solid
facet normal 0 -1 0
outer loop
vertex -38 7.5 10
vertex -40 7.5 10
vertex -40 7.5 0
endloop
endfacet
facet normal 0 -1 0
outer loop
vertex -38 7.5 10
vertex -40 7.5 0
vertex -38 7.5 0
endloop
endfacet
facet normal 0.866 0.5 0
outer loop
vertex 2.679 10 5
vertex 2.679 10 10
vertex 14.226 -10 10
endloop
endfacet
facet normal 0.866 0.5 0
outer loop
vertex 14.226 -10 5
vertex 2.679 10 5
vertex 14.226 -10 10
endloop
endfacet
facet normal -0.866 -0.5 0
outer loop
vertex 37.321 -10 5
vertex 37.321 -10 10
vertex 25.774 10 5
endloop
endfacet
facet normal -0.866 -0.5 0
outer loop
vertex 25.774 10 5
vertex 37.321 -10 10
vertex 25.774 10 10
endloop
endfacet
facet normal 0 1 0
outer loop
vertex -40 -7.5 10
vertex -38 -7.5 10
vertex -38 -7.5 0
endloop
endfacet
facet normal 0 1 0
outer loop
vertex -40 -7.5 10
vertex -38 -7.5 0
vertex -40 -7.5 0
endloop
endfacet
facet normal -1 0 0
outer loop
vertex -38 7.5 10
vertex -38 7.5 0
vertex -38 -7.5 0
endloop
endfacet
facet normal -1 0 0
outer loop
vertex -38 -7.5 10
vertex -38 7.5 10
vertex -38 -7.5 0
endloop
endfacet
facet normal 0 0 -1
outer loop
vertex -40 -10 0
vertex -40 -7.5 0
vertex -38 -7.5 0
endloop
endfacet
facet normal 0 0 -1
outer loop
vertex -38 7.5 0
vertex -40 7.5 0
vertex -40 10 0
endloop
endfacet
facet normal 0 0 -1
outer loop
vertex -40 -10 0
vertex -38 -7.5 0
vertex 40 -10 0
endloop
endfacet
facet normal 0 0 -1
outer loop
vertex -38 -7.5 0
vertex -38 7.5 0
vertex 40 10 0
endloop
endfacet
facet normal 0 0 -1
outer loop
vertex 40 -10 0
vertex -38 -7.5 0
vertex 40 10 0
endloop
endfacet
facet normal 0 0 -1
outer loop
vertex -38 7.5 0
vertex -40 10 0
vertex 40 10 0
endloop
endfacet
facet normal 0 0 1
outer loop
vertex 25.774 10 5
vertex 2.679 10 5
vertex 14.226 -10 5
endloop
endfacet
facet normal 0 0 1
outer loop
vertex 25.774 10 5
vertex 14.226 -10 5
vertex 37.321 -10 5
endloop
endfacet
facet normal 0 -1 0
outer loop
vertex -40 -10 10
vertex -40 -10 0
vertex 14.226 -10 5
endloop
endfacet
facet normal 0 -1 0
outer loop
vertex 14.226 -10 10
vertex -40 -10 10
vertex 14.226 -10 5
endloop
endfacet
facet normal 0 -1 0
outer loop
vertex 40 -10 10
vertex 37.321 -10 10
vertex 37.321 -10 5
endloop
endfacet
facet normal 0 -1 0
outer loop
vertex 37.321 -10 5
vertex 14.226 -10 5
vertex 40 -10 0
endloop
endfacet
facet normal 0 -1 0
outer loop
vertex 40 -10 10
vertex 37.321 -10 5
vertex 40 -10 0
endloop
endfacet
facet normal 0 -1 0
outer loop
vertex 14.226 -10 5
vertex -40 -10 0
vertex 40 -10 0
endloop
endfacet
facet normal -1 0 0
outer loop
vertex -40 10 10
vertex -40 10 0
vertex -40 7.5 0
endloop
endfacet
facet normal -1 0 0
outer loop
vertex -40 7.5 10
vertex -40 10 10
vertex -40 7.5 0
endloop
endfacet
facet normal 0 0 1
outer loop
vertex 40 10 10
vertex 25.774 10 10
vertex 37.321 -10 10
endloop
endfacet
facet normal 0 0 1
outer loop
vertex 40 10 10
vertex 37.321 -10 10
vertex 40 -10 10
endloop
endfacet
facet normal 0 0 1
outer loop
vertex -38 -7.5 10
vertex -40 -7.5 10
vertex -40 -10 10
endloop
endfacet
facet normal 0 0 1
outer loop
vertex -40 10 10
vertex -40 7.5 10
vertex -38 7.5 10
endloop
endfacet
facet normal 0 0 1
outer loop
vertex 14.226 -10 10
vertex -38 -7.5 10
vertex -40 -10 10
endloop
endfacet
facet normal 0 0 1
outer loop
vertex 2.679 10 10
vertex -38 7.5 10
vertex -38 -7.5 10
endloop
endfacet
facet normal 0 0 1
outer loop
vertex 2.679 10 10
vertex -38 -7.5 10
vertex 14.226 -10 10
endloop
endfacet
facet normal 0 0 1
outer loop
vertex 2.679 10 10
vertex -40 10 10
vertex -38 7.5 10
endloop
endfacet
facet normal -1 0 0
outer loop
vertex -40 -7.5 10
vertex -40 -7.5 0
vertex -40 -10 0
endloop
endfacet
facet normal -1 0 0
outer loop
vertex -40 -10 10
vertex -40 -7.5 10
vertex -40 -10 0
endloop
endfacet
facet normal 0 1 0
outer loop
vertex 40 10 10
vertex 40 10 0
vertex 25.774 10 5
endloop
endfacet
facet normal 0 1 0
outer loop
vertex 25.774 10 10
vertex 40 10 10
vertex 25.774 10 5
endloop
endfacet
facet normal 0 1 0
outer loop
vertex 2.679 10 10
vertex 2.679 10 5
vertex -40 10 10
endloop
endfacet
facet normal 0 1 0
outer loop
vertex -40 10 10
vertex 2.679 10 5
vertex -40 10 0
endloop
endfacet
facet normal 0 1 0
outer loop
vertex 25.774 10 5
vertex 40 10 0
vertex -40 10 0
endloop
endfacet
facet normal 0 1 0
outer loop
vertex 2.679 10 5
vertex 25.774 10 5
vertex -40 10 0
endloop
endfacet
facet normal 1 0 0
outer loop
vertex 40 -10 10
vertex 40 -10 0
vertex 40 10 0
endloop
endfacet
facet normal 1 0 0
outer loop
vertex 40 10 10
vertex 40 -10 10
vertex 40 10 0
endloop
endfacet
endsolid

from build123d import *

# Parameters (mm, degrees)
EXTRUDE_1_DEPTH     = 10
CUT_EXTRUDE_1_DEPTH = 5


with BuildPart() as part:
    # 草圖2 → 填料-伸長1 (new body)
    with BuildSketch(Plane.XY):
        Polygon((-40, 7.5), (-38, 7.5), (-38, -7.5), (-40, -7.5), (-40, -10), (40, -10), (40, 10), (-40, 10), align=None)
    extrude(amount=EXTRUDE_1_DEPTH)

    # 草圖3 → 除料-伸長1 (cut)
    with BuildSketch(Plane.XY.offset(10)):
        Polygon((2.679491924, 10), (14.226497308, -10), (37.320508076, -10), (25.773502692, 10), align=None)
    extrude(amount=-CUT_EXTRUDE_1_DEPTH, mode=Mode.SUBTRACT)


solid = part.part
